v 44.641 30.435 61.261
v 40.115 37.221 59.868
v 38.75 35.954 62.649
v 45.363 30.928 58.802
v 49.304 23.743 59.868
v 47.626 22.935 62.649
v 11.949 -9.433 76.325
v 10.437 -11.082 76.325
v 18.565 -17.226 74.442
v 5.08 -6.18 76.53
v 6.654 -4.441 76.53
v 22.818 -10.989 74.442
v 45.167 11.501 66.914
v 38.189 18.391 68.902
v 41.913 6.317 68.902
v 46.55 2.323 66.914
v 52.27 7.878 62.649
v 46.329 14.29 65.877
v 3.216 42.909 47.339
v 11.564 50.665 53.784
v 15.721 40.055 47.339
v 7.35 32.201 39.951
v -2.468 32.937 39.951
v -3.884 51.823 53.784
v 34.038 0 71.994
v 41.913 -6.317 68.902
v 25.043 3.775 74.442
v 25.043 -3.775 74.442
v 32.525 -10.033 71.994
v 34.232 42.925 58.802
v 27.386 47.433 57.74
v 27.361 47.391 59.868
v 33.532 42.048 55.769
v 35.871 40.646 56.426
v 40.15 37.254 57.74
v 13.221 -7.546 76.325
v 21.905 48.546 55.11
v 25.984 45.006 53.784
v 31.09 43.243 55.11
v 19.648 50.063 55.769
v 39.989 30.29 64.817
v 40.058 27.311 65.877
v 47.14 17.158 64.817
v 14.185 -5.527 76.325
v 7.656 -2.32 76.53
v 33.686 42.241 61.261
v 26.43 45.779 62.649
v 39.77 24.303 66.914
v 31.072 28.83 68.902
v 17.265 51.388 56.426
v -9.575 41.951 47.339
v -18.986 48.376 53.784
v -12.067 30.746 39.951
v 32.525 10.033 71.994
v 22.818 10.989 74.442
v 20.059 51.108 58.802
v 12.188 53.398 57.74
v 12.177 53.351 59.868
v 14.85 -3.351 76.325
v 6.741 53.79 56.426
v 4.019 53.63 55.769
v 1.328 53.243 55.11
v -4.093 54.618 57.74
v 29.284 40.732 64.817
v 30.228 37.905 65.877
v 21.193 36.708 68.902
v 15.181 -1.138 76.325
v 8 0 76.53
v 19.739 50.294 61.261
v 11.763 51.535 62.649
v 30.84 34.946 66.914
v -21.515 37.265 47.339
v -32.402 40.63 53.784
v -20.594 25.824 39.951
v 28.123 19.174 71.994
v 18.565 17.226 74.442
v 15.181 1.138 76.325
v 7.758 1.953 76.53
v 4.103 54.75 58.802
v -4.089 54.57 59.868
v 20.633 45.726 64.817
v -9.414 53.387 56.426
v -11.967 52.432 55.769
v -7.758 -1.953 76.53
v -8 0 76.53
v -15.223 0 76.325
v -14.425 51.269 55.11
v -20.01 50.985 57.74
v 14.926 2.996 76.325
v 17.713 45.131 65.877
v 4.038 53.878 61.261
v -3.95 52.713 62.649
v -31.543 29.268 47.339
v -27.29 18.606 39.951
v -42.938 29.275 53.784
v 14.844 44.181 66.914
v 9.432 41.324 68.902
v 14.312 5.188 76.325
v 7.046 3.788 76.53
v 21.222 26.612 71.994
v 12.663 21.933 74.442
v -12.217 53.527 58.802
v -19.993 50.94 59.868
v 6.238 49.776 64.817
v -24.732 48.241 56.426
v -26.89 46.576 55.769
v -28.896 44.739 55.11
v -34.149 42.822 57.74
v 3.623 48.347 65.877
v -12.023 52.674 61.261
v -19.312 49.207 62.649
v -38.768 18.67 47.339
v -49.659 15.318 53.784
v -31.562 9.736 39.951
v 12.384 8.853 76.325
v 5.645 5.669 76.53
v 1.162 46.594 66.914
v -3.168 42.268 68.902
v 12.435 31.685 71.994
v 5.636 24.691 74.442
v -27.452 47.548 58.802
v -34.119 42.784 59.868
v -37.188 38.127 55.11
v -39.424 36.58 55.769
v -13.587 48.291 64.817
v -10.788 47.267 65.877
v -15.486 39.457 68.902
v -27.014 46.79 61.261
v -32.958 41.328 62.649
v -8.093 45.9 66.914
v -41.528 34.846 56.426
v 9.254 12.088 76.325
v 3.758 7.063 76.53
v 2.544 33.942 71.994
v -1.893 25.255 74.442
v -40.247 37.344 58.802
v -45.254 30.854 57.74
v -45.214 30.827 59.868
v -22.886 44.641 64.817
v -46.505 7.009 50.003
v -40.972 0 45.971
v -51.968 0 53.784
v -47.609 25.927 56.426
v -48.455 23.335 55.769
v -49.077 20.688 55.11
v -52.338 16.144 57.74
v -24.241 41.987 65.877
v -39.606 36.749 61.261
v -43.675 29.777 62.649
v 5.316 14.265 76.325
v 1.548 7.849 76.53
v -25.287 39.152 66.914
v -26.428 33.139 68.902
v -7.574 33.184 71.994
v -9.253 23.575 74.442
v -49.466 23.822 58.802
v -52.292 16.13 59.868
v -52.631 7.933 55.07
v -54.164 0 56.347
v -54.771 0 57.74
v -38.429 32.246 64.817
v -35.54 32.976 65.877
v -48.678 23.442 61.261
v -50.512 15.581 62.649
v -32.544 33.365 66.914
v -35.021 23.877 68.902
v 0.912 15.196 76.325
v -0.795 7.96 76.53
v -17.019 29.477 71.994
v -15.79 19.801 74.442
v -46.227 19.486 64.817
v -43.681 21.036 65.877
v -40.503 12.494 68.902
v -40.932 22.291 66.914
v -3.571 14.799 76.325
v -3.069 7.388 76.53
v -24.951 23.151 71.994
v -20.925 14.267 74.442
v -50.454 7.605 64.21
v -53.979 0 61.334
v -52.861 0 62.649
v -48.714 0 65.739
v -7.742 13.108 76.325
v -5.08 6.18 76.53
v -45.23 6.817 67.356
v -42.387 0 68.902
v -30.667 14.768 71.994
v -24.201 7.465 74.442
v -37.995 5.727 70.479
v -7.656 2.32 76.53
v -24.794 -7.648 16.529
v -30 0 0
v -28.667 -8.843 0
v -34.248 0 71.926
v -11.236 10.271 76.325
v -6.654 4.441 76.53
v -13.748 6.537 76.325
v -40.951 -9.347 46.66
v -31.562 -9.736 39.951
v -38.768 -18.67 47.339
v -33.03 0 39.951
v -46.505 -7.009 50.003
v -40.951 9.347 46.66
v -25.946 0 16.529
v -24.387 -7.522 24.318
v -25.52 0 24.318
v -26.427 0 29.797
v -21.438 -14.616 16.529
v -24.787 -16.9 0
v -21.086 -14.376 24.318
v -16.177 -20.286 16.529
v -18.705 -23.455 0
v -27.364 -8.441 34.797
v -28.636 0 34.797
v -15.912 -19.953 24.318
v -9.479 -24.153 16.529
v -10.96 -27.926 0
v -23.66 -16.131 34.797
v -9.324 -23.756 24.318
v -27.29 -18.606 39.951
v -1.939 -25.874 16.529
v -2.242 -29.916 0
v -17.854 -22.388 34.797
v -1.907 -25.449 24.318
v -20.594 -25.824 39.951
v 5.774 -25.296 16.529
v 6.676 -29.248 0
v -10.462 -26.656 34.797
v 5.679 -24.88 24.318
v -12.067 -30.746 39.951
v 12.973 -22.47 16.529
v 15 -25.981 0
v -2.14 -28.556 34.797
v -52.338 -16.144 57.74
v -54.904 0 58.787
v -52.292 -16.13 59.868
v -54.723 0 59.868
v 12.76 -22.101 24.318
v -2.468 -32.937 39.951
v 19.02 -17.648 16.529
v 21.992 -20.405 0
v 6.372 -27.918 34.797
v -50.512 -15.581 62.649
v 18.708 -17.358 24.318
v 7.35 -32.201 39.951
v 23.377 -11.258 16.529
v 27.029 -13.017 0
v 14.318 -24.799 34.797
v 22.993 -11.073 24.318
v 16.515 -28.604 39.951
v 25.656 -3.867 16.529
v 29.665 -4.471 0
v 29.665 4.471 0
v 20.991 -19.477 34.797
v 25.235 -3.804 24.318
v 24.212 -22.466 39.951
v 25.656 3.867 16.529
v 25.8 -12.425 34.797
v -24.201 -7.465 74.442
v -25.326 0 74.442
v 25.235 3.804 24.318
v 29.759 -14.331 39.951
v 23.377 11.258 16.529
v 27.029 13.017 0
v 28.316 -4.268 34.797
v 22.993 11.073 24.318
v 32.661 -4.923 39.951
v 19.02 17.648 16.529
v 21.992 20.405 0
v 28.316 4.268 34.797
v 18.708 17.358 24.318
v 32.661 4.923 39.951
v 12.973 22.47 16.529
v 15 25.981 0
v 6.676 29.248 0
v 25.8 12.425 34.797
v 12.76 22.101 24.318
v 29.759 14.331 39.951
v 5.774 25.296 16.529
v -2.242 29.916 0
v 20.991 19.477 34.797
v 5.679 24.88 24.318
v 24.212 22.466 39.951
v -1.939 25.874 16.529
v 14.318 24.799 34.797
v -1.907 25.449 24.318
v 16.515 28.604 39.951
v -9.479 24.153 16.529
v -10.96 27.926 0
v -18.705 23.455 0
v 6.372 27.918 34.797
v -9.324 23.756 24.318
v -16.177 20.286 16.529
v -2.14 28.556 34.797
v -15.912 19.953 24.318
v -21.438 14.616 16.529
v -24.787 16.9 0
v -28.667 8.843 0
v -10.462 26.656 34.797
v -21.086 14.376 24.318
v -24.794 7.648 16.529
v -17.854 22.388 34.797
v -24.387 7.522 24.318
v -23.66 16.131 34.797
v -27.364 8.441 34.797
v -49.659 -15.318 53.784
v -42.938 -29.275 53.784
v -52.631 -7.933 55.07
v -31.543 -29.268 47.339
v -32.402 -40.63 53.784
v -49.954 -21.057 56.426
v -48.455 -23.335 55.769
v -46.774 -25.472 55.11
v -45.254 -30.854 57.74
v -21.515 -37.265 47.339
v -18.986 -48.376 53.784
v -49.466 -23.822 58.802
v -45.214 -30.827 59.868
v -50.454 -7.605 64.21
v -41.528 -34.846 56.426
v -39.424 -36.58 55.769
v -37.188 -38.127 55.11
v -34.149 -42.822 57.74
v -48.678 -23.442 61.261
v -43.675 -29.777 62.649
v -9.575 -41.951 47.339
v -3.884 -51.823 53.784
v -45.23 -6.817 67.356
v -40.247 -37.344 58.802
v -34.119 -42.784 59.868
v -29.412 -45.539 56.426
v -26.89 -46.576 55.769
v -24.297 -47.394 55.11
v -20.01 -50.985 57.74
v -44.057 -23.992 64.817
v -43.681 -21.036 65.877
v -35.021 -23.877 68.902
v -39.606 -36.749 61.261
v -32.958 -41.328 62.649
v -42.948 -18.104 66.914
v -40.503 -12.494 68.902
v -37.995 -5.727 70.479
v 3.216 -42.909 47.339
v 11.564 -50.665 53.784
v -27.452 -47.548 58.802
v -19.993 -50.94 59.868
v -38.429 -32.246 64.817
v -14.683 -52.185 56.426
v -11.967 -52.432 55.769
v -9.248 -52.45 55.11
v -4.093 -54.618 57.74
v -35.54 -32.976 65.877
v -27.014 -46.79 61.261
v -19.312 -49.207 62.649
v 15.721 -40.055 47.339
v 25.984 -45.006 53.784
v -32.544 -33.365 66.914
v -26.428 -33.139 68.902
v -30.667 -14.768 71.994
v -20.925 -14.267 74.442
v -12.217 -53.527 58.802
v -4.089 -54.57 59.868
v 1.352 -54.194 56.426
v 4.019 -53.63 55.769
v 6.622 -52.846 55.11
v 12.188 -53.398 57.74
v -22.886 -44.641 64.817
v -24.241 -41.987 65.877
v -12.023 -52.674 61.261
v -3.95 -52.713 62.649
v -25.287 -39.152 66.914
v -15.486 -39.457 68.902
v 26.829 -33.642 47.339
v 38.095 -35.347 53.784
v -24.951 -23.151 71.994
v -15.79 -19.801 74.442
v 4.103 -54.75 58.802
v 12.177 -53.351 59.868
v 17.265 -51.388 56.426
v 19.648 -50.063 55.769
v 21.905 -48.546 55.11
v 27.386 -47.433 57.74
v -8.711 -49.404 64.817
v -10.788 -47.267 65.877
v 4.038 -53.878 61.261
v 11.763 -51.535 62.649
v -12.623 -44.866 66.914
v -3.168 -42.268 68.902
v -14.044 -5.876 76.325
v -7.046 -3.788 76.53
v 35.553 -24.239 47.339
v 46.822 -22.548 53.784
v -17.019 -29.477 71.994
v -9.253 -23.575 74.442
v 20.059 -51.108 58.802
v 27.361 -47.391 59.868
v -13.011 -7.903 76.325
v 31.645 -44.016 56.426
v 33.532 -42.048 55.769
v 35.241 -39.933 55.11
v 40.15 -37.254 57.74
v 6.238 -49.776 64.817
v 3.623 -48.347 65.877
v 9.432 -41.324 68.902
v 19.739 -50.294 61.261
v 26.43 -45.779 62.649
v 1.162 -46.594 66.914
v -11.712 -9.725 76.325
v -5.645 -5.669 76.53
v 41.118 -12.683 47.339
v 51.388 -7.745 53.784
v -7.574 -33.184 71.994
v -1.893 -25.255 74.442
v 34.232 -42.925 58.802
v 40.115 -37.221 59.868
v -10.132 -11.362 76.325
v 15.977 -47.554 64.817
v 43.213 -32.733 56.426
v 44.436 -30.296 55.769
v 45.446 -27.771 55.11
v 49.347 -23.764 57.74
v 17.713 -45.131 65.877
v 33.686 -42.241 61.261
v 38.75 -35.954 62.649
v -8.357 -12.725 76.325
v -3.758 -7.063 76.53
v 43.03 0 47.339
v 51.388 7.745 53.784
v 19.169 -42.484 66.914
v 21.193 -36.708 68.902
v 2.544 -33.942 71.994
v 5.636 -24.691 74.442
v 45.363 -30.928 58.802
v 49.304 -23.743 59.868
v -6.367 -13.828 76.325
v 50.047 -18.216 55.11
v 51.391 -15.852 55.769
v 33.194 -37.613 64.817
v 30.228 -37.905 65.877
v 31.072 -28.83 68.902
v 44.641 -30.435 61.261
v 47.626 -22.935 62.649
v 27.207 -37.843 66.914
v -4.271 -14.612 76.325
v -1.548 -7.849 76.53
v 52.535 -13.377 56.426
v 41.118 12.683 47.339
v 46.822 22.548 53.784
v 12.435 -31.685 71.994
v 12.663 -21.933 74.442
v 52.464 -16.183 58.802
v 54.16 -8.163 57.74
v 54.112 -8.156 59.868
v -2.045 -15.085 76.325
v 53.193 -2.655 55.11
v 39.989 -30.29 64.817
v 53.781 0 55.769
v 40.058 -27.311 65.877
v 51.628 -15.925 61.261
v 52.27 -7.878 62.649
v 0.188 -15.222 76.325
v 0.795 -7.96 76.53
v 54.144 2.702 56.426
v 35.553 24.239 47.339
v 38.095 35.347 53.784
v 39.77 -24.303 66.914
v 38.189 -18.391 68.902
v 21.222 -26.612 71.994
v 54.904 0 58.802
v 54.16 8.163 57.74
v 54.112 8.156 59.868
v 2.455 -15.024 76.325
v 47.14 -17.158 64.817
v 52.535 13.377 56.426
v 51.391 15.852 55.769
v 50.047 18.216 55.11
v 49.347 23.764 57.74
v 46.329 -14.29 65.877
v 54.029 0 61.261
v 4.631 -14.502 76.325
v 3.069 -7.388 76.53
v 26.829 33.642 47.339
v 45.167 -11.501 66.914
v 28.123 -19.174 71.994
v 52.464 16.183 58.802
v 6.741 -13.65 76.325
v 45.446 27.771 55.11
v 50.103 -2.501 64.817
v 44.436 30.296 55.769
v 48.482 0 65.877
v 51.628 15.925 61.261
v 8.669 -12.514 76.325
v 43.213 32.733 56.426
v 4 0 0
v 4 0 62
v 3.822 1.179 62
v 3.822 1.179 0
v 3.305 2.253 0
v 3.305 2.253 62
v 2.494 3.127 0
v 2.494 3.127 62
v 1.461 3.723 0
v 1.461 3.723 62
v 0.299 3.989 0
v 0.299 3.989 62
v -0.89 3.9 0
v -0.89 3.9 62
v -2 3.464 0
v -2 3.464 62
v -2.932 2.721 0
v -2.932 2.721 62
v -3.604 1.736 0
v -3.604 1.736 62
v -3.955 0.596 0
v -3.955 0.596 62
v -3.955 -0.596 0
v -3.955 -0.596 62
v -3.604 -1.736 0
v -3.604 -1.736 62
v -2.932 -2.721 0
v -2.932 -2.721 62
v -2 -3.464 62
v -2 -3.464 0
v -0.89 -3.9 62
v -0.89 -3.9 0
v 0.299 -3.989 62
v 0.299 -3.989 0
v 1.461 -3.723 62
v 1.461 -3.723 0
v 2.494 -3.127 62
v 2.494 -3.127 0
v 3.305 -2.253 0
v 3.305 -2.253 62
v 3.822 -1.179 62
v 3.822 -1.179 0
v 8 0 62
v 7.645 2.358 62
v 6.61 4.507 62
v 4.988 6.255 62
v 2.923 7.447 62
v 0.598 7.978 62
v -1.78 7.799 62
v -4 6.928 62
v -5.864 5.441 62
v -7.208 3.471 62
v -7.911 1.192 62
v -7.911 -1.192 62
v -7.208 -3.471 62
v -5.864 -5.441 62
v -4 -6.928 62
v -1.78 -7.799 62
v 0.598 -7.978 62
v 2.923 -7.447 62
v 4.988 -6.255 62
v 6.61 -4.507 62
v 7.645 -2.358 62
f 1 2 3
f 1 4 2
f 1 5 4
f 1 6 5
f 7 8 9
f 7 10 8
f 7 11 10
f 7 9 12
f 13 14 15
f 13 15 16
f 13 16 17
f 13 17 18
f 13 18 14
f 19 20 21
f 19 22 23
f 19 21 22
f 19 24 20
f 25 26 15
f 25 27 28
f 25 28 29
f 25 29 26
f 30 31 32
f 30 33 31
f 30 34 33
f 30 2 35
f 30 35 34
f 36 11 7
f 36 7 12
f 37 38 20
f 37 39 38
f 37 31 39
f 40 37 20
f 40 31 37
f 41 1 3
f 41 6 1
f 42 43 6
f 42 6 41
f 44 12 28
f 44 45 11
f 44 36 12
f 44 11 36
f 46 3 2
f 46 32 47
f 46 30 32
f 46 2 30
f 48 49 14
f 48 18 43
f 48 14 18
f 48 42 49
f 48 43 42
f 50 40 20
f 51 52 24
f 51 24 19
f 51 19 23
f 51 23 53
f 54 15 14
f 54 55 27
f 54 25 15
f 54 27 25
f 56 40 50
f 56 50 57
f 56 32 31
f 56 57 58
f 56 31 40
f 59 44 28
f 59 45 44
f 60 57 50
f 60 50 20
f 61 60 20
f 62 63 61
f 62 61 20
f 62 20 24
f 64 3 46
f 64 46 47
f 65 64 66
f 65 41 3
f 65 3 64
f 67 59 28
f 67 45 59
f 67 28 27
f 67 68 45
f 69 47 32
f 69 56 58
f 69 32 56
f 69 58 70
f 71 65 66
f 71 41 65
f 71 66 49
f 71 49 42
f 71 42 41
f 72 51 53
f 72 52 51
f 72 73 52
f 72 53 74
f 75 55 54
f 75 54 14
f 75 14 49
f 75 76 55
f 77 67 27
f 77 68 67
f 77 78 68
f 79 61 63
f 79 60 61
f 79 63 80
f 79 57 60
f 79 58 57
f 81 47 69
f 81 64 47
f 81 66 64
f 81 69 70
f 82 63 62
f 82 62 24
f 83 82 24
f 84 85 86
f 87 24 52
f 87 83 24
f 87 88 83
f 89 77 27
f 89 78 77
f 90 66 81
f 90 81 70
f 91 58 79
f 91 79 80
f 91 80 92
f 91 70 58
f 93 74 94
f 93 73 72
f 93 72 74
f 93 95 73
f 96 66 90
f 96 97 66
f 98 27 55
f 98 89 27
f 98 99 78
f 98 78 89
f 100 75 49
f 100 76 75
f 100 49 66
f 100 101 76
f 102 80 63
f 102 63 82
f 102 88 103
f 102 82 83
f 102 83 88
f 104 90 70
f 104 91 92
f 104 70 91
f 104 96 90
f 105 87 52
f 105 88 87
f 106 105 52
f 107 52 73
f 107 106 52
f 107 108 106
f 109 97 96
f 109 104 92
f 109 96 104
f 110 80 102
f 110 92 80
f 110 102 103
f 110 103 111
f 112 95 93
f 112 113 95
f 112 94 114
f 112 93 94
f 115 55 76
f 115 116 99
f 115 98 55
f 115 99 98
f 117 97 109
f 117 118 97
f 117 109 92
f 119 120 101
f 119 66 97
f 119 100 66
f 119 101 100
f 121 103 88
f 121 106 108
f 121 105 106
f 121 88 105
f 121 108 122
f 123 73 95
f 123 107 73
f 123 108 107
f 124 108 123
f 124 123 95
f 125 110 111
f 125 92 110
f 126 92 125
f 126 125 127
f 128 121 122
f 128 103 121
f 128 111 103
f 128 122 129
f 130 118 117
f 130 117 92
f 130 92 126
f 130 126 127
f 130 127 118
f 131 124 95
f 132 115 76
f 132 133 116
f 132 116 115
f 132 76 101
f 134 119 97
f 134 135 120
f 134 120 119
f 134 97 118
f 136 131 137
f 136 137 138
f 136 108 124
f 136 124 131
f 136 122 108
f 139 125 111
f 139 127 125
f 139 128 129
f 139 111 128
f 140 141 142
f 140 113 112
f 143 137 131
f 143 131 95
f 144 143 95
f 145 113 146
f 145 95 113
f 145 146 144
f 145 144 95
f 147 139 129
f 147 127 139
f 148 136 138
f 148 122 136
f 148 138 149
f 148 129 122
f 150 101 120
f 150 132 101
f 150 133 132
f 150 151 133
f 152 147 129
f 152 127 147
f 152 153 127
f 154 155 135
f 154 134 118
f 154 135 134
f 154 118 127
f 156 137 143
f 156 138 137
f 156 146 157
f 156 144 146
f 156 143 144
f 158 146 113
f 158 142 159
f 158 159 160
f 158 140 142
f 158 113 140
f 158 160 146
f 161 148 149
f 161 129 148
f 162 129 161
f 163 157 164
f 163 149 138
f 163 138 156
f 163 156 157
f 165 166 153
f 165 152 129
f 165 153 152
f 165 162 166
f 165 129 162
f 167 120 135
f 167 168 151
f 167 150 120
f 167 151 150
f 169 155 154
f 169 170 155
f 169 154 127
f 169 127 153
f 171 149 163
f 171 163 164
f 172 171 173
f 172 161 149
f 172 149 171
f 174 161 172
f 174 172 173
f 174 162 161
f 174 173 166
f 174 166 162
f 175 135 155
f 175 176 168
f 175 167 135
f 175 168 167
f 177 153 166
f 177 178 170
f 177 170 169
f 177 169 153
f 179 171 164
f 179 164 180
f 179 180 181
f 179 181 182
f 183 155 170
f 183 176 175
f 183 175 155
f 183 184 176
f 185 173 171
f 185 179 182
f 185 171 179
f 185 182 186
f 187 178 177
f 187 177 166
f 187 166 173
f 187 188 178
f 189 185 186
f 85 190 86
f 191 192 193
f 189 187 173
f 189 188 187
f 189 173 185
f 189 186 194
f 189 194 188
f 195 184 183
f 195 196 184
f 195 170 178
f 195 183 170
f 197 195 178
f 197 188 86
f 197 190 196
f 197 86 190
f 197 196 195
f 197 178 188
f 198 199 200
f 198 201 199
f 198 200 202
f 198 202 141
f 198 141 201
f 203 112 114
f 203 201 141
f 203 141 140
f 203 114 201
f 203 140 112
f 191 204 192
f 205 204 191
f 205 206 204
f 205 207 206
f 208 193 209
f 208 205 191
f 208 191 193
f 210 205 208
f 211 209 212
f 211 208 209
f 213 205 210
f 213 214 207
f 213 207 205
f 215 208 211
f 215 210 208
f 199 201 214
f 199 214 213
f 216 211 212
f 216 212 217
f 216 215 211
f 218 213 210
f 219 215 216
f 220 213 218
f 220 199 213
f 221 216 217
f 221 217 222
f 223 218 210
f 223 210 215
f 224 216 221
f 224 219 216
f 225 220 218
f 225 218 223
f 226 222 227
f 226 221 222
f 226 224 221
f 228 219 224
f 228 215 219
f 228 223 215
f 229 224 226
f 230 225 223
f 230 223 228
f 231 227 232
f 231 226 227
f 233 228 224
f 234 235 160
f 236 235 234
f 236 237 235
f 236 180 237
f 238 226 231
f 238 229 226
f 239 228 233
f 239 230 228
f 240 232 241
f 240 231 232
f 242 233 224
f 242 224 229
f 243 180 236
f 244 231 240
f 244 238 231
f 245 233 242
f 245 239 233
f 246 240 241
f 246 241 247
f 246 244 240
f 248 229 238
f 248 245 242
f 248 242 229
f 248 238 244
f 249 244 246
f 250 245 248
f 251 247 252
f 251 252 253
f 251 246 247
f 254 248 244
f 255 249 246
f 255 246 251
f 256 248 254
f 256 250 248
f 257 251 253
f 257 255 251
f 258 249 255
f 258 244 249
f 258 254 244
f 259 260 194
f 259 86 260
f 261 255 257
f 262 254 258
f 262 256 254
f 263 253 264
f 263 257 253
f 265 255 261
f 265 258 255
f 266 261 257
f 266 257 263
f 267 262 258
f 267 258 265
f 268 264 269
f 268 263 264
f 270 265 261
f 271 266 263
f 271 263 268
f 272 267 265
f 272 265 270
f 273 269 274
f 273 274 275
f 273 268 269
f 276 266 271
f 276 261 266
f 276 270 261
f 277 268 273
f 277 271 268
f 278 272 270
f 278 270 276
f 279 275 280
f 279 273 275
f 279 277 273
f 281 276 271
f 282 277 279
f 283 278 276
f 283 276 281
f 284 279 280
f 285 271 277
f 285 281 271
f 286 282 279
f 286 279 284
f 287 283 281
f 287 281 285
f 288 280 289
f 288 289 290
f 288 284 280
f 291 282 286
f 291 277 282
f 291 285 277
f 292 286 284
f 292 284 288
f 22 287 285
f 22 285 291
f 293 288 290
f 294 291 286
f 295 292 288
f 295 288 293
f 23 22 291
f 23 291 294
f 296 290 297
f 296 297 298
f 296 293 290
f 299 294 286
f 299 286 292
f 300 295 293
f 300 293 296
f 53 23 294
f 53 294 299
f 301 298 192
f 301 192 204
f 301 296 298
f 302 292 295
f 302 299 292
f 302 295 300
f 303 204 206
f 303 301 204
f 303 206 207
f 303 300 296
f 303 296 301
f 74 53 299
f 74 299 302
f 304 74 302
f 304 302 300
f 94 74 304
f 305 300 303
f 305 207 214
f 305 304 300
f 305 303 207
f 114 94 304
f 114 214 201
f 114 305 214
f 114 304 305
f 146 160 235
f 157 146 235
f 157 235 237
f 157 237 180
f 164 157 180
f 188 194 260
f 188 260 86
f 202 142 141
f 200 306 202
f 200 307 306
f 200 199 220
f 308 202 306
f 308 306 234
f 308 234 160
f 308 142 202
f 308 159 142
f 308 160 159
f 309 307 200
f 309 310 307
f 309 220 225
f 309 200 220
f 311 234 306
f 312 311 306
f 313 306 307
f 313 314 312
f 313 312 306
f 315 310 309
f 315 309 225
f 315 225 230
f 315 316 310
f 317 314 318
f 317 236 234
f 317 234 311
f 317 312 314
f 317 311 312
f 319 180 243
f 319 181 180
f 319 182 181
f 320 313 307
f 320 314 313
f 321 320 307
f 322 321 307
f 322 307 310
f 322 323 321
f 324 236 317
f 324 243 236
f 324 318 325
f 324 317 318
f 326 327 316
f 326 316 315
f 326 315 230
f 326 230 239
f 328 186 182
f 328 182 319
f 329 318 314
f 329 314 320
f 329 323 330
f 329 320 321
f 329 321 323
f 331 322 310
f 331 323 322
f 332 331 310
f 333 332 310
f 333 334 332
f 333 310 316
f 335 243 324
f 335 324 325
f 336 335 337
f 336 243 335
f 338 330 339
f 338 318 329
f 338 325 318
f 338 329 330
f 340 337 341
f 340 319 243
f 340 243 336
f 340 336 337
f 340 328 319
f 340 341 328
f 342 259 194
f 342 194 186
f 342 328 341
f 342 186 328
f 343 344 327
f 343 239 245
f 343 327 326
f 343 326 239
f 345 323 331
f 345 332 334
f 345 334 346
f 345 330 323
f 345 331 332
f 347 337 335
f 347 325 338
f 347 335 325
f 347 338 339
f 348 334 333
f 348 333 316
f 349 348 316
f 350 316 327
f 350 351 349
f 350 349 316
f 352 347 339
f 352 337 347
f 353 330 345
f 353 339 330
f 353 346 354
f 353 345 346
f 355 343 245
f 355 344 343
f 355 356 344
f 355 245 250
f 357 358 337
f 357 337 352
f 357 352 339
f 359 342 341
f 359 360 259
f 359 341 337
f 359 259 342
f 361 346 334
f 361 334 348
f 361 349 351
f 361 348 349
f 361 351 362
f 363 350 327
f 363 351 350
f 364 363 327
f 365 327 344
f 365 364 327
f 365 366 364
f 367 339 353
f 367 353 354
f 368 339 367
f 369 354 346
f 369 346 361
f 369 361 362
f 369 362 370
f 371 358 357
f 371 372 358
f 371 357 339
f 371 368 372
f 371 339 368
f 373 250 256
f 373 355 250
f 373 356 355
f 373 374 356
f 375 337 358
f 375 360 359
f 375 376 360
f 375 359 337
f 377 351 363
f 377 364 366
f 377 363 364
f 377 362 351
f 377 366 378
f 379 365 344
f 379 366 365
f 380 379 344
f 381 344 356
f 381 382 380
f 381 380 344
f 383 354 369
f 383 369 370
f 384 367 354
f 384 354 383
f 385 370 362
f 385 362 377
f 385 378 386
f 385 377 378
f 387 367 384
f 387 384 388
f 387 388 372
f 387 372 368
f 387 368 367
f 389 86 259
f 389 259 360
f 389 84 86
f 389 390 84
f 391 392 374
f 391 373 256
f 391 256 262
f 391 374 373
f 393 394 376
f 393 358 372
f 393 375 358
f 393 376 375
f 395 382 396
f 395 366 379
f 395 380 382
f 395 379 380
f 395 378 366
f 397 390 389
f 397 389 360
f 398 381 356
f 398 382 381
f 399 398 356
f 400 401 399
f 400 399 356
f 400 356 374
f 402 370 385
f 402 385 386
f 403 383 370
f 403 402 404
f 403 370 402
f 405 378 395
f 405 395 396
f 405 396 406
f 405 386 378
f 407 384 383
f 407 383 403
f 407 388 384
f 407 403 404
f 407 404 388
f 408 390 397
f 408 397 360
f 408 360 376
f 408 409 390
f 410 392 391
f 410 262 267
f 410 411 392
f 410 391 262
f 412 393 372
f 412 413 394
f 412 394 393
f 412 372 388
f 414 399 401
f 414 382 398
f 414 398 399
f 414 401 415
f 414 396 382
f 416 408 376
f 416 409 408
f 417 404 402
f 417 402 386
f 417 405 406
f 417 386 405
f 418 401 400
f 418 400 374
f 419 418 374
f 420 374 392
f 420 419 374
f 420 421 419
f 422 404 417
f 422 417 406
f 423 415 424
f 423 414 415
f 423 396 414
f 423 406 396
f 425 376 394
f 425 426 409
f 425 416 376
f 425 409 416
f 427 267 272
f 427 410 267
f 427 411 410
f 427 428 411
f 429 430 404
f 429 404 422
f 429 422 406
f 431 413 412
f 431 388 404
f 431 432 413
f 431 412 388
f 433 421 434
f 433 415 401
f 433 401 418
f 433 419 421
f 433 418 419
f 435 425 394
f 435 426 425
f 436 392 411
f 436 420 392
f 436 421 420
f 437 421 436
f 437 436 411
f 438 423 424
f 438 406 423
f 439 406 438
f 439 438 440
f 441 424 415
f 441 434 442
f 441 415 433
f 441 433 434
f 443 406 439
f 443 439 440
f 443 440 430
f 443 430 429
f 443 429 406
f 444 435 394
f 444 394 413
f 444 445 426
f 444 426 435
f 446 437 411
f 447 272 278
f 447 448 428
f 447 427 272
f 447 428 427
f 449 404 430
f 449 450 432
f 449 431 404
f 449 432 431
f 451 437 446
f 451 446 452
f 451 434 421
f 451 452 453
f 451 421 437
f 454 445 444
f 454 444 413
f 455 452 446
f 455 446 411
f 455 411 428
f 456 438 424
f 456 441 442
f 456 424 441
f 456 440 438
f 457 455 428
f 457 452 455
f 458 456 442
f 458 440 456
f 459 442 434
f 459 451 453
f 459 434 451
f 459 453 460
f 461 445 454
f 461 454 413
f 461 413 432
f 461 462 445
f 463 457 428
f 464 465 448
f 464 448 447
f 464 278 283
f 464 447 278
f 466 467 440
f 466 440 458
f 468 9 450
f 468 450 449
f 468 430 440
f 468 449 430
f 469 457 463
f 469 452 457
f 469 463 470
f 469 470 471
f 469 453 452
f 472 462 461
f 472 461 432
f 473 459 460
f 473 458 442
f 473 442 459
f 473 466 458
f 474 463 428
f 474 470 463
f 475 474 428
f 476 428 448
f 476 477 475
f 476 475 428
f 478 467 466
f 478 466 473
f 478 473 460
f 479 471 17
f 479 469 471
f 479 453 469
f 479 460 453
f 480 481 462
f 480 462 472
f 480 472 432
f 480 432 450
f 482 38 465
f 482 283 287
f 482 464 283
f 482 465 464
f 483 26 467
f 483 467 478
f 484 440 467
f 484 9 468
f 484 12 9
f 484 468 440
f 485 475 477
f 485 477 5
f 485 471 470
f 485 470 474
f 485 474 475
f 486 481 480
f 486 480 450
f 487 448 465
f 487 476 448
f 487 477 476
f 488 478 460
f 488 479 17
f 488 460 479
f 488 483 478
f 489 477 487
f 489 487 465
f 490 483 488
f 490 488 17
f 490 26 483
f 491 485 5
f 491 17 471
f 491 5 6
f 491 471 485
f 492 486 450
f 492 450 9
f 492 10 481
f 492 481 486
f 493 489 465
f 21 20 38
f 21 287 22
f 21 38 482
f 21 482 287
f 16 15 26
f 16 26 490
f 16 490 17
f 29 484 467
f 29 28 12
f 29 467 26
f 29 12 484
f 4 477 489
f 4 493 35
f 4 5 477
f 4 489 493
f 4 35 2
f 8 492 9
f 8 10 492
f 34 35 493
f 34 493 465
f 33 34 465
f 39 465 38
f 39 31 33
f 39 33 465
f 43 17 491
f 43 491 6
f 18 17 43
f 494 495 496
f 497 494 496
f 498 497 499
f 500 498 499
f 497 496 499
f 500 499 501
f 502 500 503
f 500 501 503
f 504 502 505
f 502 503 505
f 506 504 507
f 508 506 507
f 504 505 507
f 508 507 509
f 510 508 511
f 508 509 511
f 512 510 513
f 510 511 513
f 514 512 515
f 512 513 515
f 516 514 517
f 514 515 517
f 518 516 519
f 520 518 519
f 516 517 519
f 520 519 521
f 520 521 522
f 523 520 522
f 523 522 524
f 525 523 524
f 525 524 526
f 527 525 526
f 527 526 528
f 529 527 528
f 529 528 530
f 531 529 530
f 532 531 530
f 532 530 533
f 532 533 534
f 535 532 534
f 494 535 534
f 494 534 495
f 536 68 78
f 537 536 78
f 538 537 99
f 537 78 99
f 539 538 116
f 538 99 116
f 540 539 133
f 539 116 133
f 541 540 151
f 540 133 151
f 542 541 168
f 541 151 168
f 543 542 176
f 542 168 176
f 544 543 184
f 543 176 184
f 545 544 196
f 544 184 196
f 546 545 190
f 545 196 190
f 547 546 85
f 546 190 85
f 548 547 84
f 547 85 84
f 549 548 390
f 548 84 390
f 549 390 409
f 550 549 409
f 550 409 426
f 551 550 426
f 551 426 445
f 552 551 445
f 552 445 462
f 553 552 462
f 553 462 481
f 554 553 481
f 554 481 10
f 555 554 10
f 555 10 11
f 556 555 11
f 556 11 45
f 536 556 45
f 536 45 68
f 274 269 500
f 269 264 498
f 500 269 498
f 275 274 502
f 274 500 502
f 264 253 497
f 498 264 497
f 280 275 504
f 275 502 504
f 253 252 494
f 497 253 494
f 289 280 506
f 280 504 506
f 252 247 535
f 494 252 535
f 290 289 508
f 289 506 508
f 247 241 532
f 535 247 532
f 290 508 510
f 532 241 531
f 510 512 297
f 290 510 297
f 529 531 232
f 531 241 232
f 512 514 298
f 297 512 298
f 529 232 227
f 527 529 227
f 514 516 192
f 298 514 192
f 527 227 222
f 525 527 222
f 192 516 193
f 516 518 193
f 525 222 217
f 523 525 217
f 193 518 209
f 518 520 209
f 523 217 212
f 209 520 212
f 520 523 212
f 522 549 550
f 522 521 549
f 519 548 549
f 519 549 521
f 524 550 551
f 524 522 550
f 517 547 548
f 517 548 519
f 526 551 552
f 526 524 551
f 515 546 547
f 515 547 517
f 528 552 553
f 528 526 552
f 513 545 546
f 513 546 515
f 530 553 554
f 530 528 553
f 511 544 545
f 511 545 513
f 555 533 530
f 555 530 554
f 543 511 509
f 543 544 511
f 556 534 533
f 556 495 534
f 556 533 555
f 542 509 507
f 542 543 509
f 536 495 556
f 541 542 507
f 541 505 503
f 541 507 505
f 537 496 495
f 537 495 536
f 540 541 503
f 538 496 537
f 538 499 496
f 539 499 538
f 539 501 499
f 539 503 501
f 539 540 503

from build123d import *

# Parameters (mm, degrees)
F3_R     = 4
F4_DEPTH = 128
F5_R     = 8
F6_DEPTH = 20


with BuildPart() as f1:
    # F0 (on Front) → F1 (revolve)
    with BuildSketch(Plane.XZ):
        with BuildLine():
            Line((-30, 0), (0, 0))
            Line((0, 0), (0, 74.4419768453))
            add(Edge.make_bspline(
                [(-30, 0), (-26.0781444115, 13.4116450928), (-18.4118492623, 39.6282222706), (-76.4407572251, 59.6656107835), (-13.1944315406, 79.611542342), (-3.5713194359, 75.8412163409), (0, 74.4419768453)],
                knots=[0, 0, 0, 0, 0.2714940232, 0.5307062604, 0.8258361915, 1, 1, 1, 1], degree=3))
        make_face()
    revolve(axis=Axis((0, 0, 37.2209884226), (0, 0, 1)))

    # F3 (on offset) → F4 (cut)
    with BuildSketch(Plane.XY.offset(82)):
        Circle(F3_R)
    extrude(amount=-F4_DEPTH, mode=Mode.SUBTRACT)

    # F5 (on offset) → F6 (cut)
    with BuildSketch(Plane.XY.offset(82)):
        Circle(F5_R)
    extrude(amount=-F6_DEPTH, mode=Mode.SUBTRACT)


solid = f1.part
